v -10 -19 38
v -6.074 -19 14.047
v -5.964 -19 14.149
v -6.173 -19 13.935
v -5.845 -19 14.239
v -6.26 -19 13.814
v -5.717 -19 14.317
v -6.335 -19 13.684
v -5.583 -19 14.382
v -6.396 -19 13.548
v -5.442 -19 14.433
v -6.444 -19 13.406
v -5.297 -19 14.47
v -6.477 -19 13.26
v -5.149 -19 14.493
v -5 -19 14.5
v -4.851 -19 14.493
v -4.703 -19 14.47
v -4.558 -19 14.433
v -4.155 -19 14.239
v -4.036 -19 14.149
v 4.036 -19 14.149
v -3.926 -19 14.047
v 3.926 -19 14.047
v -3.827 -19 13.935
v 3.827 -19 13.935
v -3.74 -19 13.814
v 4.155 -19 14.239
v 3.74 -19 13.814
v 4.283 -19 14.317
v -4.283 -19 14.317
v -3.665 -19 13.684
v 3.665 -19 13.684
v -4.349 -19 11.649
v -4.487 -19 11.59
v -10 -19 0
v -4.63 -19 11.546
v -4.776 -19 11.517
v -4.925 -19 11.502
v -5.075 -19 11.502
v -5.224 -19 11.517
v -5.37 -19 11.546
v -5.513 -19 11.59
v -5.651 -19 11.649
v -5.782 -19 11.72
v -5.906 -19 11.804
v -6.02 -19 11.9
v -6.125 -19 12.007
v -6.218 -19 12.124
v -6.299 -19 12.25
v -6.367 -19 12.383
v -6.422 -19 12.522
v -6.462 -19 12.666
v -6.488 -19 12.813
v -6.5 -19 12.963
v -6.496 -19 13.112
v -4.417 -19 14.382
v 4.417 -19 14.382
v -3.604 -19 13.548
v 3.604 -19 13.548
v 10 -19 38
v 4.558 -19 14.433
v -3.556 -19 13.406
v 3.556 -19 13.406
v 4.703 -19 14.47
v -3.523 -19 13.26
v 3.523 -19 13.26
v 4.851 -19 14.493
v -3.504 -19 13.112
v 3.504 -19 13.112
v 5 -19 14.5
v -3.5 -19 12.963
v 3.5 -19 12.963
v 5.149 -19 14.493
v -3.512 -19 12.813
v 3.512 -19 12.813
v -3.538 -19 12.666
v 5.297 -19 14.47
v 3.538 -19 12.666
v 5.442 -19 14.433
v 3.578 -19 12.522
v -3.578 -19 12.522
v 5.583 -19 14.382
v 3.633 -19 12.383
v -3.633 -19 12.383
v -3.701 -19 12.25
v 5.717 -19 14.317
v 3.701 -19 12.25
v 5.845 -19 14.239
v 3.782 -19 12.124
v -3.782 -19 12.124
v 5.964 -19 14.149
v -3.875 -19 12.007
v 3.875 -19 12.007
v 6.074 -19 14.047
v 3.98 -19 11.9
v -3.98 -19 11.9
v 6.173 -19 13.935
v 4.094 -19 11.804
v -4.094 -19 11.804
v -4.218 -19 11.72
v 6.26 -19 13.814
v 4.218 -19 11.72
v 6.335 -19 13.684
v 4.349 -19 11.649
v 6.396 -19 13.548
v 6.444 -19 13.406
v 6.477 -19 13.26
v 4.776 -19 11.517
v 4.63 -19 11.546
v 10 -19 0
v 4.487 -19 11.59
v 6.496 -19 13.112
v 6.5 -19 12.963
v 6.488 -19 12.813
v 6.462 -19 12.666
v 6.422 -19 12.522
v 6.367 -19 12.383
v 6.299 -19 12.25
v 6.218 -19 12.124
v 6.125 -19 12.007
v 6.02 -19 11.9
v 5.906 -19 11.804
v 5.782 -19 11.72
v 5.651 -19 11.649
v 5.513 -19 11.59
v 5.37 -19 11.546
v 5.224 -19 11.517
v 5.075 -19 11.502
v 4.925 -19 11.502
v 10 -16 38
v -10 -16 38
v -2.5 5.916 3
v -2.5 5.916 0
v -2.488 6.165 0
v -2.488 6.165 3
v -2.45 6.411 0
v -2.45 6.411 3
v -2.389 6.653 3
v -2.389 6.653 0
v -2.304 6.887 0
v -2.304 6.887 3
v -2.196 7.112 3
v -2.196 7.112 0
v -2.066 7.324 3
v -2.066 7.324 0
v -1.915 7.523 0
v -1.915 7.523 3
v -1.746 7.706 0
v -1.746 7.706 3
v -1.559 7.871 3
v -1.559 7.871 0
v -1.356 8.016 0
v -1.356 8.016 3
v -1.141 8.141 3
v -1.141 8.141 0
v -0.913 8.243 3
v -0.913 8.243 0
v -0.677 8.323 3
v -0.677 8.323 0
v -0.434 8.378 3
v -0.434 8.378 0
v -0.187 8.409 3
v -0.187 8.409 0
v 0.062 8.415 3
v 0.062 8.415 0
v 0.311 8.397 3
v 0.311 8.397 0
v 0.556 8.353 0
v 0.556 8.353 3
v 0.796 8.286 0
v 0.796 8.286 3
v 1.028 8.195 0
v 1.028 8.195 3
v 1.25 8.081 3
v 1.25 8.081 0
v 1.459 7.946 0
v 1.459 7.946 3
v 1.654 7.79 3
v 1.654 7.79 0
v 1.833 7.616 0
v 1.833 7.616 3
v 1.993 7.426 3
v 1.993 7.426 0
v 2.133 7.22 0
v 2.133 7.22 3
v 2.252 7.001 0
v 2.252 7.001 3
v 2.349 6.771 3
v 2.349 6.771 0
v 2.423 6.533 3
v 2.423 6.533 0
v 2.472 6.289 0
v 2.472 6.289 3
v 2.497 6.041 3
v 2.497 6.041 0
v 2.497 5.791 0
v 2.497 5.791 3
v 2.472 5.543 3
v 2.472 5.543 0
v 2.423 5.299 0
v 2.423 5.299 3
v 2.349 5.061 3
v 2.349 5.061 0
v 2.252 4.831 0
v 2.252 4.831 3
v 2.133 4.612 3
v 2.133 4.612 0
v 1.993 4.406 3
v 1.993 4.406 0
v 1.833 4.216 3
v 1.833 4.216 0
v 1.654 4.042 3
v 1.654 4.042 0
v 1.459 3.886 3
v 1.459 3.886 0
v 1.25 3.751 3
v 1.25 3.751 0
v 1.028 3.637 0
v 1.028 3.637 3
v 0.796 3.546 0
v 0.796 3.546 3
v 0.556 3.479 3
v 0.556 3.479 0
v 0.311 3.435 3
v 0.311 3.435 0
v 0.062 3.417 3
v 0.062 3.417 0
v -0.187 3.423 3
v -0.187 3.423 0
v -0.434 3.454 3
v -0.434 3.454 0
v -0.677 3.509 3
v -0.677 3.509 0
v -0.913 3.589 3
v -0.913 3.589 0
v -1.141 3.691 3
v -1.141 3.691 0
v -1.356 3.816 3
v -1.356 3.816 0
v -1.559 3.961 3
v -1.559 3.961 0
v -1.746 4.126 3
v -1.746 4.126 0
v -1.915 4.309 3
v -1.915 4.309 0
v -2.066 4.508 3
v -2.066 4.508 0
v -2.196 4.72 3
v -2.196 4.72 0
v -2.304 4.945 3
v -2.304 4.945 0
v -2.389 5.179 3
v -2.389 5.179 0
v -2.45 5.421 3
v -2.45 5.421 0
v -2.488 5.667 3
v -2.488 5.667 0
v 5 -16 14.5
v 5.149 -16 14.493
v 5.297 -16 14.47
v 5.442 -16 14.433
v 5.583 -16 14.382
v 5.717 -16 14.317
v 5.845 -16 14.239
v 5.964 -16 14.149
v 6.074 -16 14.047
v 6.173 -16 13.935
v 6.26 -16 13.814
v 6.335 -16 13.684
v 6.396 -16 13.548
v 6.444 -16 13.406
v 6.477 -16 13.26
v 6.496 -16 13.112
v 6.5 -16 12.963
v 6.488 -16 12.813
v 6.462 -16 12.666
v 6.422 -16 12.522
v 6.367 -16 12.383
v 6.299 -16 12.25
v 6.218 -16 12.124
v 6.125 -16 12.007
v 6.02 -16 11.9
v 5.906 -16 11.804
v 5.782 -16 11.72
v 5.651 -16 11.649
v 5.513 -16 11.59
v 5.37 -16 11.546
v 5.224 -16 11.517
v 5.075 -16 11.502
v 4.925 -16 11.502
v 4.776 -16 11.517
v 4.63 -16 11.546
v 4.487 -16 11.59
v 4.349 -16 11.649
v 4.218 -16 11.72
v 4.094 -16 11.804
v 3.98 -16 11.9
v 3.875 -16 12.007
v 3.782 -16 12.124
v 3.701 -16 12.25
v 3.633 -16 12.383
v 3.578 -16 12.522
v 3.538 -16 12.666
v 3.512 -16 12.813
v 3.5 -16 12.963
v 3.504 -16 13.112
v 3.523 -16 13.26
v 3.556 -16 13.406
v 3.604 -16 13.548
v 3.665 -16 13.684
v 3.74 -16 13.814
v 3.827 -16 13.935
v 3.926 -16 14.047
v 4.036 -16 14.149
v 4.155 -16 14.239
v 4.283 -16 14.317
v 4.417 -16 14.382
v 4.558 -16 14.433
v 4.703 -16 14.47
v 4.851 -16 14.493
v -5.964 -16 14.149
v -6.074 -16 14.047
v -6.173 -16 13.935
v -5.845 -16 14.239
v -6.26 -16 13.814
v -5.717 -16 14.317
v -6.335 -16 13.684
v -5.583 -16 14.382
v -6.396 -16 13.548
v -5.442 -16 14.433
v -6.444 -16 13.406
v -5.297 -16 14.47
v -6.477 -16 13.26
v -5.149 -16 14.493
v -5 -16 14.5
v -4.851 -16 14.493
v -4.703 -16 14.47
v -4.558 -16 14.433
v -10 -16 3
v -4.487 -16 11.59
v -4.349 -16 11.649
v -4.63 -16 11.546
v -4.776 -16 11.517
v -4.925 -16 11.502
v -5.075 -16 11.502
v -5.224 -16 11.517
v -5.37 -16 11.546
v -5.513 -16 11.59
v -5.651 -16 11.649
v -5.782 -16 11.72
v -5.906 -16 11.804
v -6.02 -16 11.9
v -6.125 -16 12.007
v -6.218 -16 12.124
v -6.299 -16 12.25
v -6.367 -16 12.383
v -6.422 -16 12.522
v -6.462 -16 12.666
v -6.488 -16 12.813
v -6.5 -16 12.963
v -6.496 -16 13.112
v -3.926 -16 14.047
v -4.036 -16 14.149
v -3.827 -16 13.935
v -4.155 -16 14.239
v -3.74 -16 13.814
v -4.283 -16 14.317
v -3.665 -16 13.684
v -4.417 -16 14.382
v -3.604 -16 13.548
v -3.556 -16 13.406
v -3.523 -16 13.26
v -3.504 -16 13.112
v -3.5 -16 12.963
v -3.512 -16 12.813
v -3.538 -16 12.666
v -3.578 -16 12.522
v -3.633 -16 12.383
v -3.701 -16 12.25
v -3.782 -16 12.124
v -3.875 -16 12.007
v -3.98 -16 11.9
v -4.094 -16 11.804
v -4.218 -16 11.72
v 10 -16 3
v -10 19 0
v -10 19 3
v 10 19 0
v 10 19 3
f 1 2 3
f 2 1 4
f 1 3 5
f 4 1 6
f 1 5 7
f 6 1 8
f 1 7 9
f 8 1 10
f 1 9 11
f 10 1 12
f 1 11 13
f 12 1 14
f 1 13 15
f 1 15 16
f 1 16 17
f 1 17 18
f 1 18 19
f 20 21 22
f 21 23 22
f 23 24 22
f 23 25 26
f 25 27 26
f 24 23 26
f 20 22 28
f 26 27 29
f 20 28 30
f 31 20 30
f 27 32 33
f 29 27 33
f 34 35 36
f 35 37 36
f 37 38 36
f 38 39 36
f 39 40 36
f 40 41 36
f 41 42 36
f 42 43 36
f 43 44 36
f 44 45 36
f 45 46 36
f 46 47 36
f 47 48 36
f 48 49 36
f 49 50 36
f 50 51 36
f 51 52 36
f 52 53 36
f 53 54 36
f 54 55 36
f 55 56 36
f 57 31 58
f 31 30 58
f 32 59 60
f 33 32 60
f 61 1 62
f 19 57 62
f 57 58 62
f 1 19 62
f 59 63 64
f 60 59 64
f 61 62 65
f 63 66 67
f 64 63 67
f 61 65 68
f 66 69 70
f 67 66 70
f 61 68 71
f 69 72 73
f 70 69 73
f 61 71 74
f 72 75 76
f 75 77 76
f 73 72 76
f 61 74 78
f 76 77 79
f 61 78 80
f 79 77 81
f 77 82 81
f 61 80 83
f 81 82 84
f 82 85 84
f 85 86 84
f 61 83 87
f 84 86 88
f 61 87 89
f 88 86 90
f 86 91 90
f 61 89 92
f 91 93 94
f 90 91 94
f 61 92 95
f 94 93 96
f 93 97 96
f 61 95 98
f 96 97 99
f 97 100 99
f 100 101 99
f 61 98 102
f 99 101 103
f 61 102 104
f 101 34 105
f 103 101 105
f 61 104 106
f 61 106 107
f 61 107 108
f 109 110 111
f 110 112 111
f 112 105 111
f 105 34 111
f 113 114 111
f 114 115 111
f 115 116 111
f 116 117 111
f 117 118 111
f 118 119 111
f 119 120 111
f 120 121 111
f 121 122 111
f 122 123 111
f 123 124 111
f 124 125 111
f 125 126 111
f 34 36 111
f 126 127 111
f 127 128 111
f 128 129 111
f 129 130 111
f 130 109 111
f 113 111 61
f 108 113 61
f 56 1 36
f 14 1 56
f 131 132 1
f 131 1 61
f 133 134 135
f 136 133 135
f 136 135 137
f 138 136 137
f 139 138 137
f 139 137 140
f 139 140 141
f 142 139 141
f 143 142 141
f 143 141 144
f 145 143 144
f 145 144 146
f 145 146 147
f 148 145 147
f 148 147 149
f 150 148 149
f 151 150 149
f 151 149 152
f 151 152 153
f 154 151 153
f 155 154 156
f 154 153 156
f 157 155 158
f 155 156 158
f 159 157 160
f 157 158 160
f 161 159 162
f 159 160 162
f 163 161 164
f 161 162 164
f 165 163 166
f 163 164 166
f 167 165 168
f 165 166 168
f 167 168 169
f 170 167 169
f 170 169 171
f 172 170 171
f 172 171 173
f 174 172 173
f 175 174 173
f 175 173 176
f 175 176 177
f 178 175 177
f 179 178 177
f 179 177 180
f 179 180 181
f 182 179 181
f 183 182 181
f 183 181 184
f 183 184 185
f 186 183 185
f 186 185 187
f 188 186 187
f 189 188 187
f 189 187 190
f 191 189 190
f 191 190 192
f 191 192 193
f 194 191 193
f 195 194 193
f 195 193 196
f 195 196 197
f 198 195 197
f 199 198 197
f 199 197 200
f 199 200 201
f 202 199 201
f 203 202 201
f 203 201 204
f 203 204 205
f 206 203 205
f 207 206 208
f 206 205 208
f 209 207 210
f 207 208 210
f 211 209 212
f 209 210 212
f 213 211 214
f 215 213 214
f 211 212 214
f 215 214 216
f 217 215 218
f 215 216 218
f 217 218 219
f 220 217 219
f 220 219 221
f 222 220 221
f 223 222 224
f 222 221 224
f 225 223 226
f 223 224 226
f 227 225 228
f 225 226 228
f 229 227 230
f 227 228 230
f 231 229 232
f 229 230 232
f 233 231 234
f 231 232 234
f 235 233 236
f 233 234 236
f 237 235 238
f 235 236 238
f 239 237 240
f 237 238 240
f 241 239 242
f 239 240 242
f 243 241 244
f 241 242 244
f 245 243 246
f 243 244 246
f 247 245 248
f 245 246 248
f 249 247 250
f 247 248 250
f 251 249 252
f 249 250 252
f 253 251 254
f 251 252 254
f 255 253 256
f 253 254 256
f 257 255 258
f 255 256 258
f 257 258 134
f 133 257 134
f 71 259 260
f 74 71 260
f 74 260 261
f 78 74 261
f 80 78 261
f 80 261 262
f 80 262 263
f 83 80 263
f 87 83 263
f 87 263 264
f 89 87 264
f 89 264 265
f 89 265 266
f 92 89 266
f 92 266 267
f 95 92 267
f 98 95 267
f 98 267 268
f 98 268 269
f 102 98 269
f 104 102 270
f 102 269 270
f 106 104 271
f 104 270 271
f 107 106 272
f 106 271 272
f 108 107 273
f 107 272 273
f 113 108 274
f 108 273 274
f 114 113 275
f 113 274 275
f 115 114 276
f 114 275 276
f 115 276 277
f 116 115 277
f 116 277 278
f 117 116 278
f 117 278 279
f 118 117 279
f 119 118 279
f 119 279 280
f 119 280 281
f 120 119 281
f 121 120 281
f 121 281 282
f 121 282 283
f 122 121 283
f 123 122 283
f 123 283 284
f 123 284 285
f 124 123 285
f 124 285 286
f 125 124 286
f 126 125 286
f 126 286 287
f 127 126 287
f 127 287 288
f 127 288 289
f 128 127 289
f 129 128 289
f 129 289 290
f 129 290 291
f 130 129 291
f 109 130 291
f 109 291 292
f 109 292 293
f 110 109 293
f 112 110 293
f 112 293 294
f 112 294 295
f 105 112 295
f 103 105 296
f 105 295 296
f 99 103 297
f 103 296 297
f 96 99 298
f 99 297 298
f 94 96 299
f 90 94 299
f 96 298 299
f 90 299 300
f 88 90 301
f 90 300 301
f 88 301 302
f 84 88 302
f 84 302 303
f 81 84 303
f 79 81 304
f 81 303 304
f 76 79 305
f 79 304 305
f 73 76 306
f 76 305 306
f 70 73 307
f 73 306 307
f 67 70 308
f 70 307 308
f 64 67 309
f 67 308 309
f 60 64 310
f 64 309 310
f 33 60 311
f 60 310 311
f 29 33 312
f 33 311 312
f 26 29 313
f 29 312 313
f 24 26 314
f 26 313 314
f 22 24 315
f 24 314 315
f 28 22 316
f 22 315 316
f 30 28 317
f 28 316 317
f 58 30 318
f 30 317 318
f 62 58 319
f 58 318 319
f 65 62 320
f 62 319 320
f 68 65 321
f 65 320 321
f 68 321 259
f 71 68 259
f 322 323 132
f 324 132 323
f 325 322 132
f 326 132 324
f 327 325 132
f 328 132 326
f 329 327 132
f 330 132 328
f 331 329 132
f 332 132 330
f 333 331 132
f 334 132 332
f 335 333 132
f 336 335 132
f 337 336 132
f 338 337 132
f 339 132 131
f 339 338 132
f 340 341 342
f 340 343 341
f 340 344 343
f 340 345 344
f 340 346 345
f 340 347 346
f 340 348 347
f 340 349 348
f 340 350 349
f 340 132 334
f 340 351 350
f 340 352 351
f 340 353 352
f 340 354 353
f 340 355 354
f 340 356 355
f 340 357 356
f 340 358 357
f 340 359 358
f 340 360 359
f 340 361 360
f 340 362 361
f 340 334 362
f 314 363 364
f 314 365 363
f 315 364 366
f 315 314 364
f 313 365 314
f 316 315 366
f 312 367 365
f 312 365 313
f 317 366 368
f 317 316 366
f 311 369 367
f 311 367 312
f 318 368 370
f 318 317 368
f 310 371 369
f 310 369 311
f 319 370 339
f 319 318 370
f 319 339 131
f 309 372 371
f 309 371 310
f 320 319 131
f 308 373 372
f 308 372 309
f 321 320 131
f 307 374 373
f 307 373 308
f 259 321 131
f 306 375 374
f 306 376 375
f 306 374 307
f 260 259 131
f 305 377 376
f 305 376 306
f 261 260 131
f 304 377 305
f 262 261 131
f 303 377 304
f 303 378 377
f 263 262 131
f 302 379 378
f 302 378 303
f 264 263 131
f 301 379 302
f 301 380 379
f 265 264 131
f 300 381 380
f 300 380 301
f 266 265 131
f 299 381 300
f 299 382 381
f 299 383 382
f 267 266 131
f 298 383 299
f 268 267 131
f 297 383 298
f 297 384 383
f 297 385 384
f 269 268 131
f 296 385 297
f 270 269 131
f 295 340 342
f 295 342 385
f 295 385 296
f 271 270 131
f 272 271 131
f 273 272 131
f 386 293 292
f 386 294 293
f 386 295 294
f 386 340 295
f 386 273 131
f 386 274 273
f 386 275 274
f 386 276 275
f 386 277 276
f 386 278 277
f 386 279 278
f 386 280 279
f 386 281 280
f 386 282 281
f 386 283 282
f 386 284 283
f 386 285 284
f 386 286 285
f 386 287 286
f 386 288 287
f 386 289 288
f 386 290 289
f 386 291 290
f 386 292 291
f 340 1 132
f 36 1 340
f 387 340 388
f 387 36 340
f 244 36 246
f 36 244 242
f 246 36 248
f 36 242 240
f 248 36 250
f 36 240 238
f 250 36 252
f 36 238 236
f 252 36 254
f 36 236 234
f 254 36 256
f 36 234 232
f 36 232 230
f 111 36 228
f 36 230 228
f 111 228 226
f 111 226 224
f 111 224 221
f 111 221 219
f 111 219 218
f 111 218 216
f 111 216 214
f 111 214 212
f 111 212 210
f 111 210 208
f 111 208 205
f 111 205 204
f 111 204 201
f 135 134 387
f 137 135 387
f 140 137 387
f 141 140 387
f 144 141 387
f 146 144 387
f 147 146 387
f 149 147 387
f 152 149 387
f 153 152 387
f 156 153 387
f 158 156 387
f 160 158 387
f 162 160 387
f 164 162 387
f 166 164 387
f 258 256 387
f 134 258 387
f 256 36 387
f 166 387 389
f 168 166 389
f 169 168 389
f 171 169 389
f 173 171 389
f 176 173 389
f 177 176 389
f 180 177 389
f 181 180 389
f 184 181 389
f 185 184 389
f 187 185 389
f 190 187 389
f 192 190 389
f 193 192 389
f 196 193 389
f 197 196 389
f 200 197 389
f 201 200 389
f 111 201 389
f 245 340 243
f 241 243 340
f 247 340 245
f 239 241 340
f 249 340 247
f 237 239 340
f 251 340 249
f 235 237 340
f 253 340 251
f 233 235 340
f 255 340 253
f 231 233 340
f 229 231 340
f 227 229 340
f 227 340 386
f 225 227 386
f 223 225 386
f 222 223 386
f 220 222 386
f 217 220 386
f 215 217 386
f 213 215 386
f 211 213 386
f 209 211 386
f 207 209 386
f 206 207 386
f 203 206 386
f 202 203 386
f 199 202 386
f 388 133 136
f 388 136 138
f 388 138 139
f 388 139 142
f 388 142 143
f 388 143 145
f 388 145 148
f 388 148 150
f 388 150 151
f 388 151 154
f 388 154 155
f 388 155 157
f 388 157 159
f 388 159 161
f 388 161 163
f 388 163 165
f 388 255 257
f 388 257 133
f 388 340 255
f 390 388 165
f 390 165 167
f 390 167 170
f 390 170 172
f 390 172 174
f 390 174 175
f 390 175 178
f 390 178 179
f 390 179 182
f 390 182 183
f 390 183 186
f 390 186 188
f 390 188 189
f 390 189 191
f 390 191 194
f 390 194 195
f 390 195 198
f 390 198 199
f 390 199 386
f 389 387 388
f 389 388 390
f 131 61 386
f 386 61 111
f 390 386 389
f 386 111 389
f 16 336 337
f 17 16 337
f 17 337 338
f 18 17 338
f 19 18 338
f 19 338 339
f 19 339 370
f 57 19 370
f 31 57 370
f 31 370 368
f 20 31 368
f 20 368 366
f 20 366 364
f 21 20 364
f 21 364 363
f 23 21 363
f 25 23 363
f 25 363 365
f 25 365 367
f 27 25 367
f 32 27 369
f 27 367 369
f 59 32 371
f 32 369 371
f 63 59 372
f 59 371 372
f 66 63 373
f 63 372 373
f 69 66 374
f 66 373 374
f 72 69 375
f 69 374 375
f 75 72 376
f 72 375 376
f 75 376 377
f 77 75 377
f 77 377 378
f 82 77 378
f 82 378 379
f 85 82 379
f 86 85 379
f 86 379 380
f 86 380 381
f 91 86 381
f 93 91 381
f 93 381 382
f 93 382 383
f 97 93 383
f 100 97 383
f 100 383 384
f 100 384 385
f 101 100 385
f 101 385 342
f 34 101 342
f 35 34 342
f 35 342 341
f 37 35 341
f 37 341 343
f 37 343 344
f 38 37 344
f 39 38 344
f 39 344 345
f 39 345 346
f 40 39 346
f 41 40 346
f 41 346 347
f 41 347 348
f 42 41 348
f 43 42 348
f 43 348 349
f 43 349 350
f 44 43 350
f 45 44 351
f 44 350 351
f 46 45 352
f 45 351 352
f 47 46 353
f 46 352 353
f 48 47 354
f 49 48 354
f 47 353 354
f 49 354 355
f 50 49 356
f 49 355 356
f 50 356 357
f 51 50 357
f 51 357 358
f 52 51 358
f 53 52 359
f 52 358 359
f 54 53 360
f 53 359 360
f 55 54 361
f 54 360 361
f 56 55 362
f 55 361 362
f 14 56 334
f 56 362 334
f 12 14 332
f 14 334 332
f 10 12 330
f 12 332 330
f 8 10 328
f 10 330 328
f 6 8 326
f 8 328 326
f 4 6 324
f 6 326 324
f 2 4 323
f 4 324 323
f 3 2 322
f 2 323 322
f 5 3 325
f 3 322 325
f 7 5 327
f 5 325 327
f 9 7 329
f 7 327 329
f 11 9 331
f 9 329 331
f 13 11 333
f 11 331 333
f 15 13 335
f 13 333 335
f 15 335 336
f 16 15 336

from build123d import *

# Parameters (mm, degrees)
SKETCH_1_W          = 20
SKETCH_1_H          = 38
EXTRUDE_1_DEPTH     = 3
SKETCH_2_W          = 20
SKETCH_2_H          = 3
EXTRUDE_2_DEPTH     = 35
SKETCH_3_R          = 2.5
CUT_EXTRUDE_1_DEPTH = 10
SKETCH_4_R          = 1.5
CUT_EXTRUDE_2_DEPTH = 10


with BuildPart() as part:
    # 草图1 → 凸台-拉伸1 (new body)
    with BuildSketch(Plane.XY):
        Rectangle(SKETCH_1_W, SKETCH_1_H)
    extrude(amount=EXTRUDE_1_DEPTH)

    # 草图2 → 凸台-拉伸2 (add)
    with BuildSketch(Plane.XY.offset(3)):
        with Locations((0, -17.5)):
            Rectangle(SKETCH_2_W, SKETCH_2_H)
    extrude(amount=EXTRUDE_2_DEPTH)

    # 草图3 → 切除-拉伸1 (cut)
    with BuildSketch(Plane(origin=(0, 0, 0), x_dir=(-1, 0, 0), z_dir=(0, 0, -1))):
        with Locations((0, 5.915992135)):
            Circle(SKETCH_3_R)
    extrude(amount=-CUT_EXTRUDE_1_DEPTH, mode=Mode.SUBTRACT)

    # 草图4 → 切除-拉伸2 (cut)
    with BuildSketch(Plane(origin=(0, -16, 0), x_dir=(1, 0, 0), z_dir=(0, 1, 0))):
        with Locations(Location((-5, -13, 0), (0, 0, 270))):
            Circle(SKETCH_4_R)
        with Locations(Location((5, -13, 0), (0, 0, 270))):
            Circle(SKETCH_4_R)
    extrude(amount=-CUT_EXTRUDE_2_DEPTH, mode=Mode.SUBTRACT)


solid = part.part
